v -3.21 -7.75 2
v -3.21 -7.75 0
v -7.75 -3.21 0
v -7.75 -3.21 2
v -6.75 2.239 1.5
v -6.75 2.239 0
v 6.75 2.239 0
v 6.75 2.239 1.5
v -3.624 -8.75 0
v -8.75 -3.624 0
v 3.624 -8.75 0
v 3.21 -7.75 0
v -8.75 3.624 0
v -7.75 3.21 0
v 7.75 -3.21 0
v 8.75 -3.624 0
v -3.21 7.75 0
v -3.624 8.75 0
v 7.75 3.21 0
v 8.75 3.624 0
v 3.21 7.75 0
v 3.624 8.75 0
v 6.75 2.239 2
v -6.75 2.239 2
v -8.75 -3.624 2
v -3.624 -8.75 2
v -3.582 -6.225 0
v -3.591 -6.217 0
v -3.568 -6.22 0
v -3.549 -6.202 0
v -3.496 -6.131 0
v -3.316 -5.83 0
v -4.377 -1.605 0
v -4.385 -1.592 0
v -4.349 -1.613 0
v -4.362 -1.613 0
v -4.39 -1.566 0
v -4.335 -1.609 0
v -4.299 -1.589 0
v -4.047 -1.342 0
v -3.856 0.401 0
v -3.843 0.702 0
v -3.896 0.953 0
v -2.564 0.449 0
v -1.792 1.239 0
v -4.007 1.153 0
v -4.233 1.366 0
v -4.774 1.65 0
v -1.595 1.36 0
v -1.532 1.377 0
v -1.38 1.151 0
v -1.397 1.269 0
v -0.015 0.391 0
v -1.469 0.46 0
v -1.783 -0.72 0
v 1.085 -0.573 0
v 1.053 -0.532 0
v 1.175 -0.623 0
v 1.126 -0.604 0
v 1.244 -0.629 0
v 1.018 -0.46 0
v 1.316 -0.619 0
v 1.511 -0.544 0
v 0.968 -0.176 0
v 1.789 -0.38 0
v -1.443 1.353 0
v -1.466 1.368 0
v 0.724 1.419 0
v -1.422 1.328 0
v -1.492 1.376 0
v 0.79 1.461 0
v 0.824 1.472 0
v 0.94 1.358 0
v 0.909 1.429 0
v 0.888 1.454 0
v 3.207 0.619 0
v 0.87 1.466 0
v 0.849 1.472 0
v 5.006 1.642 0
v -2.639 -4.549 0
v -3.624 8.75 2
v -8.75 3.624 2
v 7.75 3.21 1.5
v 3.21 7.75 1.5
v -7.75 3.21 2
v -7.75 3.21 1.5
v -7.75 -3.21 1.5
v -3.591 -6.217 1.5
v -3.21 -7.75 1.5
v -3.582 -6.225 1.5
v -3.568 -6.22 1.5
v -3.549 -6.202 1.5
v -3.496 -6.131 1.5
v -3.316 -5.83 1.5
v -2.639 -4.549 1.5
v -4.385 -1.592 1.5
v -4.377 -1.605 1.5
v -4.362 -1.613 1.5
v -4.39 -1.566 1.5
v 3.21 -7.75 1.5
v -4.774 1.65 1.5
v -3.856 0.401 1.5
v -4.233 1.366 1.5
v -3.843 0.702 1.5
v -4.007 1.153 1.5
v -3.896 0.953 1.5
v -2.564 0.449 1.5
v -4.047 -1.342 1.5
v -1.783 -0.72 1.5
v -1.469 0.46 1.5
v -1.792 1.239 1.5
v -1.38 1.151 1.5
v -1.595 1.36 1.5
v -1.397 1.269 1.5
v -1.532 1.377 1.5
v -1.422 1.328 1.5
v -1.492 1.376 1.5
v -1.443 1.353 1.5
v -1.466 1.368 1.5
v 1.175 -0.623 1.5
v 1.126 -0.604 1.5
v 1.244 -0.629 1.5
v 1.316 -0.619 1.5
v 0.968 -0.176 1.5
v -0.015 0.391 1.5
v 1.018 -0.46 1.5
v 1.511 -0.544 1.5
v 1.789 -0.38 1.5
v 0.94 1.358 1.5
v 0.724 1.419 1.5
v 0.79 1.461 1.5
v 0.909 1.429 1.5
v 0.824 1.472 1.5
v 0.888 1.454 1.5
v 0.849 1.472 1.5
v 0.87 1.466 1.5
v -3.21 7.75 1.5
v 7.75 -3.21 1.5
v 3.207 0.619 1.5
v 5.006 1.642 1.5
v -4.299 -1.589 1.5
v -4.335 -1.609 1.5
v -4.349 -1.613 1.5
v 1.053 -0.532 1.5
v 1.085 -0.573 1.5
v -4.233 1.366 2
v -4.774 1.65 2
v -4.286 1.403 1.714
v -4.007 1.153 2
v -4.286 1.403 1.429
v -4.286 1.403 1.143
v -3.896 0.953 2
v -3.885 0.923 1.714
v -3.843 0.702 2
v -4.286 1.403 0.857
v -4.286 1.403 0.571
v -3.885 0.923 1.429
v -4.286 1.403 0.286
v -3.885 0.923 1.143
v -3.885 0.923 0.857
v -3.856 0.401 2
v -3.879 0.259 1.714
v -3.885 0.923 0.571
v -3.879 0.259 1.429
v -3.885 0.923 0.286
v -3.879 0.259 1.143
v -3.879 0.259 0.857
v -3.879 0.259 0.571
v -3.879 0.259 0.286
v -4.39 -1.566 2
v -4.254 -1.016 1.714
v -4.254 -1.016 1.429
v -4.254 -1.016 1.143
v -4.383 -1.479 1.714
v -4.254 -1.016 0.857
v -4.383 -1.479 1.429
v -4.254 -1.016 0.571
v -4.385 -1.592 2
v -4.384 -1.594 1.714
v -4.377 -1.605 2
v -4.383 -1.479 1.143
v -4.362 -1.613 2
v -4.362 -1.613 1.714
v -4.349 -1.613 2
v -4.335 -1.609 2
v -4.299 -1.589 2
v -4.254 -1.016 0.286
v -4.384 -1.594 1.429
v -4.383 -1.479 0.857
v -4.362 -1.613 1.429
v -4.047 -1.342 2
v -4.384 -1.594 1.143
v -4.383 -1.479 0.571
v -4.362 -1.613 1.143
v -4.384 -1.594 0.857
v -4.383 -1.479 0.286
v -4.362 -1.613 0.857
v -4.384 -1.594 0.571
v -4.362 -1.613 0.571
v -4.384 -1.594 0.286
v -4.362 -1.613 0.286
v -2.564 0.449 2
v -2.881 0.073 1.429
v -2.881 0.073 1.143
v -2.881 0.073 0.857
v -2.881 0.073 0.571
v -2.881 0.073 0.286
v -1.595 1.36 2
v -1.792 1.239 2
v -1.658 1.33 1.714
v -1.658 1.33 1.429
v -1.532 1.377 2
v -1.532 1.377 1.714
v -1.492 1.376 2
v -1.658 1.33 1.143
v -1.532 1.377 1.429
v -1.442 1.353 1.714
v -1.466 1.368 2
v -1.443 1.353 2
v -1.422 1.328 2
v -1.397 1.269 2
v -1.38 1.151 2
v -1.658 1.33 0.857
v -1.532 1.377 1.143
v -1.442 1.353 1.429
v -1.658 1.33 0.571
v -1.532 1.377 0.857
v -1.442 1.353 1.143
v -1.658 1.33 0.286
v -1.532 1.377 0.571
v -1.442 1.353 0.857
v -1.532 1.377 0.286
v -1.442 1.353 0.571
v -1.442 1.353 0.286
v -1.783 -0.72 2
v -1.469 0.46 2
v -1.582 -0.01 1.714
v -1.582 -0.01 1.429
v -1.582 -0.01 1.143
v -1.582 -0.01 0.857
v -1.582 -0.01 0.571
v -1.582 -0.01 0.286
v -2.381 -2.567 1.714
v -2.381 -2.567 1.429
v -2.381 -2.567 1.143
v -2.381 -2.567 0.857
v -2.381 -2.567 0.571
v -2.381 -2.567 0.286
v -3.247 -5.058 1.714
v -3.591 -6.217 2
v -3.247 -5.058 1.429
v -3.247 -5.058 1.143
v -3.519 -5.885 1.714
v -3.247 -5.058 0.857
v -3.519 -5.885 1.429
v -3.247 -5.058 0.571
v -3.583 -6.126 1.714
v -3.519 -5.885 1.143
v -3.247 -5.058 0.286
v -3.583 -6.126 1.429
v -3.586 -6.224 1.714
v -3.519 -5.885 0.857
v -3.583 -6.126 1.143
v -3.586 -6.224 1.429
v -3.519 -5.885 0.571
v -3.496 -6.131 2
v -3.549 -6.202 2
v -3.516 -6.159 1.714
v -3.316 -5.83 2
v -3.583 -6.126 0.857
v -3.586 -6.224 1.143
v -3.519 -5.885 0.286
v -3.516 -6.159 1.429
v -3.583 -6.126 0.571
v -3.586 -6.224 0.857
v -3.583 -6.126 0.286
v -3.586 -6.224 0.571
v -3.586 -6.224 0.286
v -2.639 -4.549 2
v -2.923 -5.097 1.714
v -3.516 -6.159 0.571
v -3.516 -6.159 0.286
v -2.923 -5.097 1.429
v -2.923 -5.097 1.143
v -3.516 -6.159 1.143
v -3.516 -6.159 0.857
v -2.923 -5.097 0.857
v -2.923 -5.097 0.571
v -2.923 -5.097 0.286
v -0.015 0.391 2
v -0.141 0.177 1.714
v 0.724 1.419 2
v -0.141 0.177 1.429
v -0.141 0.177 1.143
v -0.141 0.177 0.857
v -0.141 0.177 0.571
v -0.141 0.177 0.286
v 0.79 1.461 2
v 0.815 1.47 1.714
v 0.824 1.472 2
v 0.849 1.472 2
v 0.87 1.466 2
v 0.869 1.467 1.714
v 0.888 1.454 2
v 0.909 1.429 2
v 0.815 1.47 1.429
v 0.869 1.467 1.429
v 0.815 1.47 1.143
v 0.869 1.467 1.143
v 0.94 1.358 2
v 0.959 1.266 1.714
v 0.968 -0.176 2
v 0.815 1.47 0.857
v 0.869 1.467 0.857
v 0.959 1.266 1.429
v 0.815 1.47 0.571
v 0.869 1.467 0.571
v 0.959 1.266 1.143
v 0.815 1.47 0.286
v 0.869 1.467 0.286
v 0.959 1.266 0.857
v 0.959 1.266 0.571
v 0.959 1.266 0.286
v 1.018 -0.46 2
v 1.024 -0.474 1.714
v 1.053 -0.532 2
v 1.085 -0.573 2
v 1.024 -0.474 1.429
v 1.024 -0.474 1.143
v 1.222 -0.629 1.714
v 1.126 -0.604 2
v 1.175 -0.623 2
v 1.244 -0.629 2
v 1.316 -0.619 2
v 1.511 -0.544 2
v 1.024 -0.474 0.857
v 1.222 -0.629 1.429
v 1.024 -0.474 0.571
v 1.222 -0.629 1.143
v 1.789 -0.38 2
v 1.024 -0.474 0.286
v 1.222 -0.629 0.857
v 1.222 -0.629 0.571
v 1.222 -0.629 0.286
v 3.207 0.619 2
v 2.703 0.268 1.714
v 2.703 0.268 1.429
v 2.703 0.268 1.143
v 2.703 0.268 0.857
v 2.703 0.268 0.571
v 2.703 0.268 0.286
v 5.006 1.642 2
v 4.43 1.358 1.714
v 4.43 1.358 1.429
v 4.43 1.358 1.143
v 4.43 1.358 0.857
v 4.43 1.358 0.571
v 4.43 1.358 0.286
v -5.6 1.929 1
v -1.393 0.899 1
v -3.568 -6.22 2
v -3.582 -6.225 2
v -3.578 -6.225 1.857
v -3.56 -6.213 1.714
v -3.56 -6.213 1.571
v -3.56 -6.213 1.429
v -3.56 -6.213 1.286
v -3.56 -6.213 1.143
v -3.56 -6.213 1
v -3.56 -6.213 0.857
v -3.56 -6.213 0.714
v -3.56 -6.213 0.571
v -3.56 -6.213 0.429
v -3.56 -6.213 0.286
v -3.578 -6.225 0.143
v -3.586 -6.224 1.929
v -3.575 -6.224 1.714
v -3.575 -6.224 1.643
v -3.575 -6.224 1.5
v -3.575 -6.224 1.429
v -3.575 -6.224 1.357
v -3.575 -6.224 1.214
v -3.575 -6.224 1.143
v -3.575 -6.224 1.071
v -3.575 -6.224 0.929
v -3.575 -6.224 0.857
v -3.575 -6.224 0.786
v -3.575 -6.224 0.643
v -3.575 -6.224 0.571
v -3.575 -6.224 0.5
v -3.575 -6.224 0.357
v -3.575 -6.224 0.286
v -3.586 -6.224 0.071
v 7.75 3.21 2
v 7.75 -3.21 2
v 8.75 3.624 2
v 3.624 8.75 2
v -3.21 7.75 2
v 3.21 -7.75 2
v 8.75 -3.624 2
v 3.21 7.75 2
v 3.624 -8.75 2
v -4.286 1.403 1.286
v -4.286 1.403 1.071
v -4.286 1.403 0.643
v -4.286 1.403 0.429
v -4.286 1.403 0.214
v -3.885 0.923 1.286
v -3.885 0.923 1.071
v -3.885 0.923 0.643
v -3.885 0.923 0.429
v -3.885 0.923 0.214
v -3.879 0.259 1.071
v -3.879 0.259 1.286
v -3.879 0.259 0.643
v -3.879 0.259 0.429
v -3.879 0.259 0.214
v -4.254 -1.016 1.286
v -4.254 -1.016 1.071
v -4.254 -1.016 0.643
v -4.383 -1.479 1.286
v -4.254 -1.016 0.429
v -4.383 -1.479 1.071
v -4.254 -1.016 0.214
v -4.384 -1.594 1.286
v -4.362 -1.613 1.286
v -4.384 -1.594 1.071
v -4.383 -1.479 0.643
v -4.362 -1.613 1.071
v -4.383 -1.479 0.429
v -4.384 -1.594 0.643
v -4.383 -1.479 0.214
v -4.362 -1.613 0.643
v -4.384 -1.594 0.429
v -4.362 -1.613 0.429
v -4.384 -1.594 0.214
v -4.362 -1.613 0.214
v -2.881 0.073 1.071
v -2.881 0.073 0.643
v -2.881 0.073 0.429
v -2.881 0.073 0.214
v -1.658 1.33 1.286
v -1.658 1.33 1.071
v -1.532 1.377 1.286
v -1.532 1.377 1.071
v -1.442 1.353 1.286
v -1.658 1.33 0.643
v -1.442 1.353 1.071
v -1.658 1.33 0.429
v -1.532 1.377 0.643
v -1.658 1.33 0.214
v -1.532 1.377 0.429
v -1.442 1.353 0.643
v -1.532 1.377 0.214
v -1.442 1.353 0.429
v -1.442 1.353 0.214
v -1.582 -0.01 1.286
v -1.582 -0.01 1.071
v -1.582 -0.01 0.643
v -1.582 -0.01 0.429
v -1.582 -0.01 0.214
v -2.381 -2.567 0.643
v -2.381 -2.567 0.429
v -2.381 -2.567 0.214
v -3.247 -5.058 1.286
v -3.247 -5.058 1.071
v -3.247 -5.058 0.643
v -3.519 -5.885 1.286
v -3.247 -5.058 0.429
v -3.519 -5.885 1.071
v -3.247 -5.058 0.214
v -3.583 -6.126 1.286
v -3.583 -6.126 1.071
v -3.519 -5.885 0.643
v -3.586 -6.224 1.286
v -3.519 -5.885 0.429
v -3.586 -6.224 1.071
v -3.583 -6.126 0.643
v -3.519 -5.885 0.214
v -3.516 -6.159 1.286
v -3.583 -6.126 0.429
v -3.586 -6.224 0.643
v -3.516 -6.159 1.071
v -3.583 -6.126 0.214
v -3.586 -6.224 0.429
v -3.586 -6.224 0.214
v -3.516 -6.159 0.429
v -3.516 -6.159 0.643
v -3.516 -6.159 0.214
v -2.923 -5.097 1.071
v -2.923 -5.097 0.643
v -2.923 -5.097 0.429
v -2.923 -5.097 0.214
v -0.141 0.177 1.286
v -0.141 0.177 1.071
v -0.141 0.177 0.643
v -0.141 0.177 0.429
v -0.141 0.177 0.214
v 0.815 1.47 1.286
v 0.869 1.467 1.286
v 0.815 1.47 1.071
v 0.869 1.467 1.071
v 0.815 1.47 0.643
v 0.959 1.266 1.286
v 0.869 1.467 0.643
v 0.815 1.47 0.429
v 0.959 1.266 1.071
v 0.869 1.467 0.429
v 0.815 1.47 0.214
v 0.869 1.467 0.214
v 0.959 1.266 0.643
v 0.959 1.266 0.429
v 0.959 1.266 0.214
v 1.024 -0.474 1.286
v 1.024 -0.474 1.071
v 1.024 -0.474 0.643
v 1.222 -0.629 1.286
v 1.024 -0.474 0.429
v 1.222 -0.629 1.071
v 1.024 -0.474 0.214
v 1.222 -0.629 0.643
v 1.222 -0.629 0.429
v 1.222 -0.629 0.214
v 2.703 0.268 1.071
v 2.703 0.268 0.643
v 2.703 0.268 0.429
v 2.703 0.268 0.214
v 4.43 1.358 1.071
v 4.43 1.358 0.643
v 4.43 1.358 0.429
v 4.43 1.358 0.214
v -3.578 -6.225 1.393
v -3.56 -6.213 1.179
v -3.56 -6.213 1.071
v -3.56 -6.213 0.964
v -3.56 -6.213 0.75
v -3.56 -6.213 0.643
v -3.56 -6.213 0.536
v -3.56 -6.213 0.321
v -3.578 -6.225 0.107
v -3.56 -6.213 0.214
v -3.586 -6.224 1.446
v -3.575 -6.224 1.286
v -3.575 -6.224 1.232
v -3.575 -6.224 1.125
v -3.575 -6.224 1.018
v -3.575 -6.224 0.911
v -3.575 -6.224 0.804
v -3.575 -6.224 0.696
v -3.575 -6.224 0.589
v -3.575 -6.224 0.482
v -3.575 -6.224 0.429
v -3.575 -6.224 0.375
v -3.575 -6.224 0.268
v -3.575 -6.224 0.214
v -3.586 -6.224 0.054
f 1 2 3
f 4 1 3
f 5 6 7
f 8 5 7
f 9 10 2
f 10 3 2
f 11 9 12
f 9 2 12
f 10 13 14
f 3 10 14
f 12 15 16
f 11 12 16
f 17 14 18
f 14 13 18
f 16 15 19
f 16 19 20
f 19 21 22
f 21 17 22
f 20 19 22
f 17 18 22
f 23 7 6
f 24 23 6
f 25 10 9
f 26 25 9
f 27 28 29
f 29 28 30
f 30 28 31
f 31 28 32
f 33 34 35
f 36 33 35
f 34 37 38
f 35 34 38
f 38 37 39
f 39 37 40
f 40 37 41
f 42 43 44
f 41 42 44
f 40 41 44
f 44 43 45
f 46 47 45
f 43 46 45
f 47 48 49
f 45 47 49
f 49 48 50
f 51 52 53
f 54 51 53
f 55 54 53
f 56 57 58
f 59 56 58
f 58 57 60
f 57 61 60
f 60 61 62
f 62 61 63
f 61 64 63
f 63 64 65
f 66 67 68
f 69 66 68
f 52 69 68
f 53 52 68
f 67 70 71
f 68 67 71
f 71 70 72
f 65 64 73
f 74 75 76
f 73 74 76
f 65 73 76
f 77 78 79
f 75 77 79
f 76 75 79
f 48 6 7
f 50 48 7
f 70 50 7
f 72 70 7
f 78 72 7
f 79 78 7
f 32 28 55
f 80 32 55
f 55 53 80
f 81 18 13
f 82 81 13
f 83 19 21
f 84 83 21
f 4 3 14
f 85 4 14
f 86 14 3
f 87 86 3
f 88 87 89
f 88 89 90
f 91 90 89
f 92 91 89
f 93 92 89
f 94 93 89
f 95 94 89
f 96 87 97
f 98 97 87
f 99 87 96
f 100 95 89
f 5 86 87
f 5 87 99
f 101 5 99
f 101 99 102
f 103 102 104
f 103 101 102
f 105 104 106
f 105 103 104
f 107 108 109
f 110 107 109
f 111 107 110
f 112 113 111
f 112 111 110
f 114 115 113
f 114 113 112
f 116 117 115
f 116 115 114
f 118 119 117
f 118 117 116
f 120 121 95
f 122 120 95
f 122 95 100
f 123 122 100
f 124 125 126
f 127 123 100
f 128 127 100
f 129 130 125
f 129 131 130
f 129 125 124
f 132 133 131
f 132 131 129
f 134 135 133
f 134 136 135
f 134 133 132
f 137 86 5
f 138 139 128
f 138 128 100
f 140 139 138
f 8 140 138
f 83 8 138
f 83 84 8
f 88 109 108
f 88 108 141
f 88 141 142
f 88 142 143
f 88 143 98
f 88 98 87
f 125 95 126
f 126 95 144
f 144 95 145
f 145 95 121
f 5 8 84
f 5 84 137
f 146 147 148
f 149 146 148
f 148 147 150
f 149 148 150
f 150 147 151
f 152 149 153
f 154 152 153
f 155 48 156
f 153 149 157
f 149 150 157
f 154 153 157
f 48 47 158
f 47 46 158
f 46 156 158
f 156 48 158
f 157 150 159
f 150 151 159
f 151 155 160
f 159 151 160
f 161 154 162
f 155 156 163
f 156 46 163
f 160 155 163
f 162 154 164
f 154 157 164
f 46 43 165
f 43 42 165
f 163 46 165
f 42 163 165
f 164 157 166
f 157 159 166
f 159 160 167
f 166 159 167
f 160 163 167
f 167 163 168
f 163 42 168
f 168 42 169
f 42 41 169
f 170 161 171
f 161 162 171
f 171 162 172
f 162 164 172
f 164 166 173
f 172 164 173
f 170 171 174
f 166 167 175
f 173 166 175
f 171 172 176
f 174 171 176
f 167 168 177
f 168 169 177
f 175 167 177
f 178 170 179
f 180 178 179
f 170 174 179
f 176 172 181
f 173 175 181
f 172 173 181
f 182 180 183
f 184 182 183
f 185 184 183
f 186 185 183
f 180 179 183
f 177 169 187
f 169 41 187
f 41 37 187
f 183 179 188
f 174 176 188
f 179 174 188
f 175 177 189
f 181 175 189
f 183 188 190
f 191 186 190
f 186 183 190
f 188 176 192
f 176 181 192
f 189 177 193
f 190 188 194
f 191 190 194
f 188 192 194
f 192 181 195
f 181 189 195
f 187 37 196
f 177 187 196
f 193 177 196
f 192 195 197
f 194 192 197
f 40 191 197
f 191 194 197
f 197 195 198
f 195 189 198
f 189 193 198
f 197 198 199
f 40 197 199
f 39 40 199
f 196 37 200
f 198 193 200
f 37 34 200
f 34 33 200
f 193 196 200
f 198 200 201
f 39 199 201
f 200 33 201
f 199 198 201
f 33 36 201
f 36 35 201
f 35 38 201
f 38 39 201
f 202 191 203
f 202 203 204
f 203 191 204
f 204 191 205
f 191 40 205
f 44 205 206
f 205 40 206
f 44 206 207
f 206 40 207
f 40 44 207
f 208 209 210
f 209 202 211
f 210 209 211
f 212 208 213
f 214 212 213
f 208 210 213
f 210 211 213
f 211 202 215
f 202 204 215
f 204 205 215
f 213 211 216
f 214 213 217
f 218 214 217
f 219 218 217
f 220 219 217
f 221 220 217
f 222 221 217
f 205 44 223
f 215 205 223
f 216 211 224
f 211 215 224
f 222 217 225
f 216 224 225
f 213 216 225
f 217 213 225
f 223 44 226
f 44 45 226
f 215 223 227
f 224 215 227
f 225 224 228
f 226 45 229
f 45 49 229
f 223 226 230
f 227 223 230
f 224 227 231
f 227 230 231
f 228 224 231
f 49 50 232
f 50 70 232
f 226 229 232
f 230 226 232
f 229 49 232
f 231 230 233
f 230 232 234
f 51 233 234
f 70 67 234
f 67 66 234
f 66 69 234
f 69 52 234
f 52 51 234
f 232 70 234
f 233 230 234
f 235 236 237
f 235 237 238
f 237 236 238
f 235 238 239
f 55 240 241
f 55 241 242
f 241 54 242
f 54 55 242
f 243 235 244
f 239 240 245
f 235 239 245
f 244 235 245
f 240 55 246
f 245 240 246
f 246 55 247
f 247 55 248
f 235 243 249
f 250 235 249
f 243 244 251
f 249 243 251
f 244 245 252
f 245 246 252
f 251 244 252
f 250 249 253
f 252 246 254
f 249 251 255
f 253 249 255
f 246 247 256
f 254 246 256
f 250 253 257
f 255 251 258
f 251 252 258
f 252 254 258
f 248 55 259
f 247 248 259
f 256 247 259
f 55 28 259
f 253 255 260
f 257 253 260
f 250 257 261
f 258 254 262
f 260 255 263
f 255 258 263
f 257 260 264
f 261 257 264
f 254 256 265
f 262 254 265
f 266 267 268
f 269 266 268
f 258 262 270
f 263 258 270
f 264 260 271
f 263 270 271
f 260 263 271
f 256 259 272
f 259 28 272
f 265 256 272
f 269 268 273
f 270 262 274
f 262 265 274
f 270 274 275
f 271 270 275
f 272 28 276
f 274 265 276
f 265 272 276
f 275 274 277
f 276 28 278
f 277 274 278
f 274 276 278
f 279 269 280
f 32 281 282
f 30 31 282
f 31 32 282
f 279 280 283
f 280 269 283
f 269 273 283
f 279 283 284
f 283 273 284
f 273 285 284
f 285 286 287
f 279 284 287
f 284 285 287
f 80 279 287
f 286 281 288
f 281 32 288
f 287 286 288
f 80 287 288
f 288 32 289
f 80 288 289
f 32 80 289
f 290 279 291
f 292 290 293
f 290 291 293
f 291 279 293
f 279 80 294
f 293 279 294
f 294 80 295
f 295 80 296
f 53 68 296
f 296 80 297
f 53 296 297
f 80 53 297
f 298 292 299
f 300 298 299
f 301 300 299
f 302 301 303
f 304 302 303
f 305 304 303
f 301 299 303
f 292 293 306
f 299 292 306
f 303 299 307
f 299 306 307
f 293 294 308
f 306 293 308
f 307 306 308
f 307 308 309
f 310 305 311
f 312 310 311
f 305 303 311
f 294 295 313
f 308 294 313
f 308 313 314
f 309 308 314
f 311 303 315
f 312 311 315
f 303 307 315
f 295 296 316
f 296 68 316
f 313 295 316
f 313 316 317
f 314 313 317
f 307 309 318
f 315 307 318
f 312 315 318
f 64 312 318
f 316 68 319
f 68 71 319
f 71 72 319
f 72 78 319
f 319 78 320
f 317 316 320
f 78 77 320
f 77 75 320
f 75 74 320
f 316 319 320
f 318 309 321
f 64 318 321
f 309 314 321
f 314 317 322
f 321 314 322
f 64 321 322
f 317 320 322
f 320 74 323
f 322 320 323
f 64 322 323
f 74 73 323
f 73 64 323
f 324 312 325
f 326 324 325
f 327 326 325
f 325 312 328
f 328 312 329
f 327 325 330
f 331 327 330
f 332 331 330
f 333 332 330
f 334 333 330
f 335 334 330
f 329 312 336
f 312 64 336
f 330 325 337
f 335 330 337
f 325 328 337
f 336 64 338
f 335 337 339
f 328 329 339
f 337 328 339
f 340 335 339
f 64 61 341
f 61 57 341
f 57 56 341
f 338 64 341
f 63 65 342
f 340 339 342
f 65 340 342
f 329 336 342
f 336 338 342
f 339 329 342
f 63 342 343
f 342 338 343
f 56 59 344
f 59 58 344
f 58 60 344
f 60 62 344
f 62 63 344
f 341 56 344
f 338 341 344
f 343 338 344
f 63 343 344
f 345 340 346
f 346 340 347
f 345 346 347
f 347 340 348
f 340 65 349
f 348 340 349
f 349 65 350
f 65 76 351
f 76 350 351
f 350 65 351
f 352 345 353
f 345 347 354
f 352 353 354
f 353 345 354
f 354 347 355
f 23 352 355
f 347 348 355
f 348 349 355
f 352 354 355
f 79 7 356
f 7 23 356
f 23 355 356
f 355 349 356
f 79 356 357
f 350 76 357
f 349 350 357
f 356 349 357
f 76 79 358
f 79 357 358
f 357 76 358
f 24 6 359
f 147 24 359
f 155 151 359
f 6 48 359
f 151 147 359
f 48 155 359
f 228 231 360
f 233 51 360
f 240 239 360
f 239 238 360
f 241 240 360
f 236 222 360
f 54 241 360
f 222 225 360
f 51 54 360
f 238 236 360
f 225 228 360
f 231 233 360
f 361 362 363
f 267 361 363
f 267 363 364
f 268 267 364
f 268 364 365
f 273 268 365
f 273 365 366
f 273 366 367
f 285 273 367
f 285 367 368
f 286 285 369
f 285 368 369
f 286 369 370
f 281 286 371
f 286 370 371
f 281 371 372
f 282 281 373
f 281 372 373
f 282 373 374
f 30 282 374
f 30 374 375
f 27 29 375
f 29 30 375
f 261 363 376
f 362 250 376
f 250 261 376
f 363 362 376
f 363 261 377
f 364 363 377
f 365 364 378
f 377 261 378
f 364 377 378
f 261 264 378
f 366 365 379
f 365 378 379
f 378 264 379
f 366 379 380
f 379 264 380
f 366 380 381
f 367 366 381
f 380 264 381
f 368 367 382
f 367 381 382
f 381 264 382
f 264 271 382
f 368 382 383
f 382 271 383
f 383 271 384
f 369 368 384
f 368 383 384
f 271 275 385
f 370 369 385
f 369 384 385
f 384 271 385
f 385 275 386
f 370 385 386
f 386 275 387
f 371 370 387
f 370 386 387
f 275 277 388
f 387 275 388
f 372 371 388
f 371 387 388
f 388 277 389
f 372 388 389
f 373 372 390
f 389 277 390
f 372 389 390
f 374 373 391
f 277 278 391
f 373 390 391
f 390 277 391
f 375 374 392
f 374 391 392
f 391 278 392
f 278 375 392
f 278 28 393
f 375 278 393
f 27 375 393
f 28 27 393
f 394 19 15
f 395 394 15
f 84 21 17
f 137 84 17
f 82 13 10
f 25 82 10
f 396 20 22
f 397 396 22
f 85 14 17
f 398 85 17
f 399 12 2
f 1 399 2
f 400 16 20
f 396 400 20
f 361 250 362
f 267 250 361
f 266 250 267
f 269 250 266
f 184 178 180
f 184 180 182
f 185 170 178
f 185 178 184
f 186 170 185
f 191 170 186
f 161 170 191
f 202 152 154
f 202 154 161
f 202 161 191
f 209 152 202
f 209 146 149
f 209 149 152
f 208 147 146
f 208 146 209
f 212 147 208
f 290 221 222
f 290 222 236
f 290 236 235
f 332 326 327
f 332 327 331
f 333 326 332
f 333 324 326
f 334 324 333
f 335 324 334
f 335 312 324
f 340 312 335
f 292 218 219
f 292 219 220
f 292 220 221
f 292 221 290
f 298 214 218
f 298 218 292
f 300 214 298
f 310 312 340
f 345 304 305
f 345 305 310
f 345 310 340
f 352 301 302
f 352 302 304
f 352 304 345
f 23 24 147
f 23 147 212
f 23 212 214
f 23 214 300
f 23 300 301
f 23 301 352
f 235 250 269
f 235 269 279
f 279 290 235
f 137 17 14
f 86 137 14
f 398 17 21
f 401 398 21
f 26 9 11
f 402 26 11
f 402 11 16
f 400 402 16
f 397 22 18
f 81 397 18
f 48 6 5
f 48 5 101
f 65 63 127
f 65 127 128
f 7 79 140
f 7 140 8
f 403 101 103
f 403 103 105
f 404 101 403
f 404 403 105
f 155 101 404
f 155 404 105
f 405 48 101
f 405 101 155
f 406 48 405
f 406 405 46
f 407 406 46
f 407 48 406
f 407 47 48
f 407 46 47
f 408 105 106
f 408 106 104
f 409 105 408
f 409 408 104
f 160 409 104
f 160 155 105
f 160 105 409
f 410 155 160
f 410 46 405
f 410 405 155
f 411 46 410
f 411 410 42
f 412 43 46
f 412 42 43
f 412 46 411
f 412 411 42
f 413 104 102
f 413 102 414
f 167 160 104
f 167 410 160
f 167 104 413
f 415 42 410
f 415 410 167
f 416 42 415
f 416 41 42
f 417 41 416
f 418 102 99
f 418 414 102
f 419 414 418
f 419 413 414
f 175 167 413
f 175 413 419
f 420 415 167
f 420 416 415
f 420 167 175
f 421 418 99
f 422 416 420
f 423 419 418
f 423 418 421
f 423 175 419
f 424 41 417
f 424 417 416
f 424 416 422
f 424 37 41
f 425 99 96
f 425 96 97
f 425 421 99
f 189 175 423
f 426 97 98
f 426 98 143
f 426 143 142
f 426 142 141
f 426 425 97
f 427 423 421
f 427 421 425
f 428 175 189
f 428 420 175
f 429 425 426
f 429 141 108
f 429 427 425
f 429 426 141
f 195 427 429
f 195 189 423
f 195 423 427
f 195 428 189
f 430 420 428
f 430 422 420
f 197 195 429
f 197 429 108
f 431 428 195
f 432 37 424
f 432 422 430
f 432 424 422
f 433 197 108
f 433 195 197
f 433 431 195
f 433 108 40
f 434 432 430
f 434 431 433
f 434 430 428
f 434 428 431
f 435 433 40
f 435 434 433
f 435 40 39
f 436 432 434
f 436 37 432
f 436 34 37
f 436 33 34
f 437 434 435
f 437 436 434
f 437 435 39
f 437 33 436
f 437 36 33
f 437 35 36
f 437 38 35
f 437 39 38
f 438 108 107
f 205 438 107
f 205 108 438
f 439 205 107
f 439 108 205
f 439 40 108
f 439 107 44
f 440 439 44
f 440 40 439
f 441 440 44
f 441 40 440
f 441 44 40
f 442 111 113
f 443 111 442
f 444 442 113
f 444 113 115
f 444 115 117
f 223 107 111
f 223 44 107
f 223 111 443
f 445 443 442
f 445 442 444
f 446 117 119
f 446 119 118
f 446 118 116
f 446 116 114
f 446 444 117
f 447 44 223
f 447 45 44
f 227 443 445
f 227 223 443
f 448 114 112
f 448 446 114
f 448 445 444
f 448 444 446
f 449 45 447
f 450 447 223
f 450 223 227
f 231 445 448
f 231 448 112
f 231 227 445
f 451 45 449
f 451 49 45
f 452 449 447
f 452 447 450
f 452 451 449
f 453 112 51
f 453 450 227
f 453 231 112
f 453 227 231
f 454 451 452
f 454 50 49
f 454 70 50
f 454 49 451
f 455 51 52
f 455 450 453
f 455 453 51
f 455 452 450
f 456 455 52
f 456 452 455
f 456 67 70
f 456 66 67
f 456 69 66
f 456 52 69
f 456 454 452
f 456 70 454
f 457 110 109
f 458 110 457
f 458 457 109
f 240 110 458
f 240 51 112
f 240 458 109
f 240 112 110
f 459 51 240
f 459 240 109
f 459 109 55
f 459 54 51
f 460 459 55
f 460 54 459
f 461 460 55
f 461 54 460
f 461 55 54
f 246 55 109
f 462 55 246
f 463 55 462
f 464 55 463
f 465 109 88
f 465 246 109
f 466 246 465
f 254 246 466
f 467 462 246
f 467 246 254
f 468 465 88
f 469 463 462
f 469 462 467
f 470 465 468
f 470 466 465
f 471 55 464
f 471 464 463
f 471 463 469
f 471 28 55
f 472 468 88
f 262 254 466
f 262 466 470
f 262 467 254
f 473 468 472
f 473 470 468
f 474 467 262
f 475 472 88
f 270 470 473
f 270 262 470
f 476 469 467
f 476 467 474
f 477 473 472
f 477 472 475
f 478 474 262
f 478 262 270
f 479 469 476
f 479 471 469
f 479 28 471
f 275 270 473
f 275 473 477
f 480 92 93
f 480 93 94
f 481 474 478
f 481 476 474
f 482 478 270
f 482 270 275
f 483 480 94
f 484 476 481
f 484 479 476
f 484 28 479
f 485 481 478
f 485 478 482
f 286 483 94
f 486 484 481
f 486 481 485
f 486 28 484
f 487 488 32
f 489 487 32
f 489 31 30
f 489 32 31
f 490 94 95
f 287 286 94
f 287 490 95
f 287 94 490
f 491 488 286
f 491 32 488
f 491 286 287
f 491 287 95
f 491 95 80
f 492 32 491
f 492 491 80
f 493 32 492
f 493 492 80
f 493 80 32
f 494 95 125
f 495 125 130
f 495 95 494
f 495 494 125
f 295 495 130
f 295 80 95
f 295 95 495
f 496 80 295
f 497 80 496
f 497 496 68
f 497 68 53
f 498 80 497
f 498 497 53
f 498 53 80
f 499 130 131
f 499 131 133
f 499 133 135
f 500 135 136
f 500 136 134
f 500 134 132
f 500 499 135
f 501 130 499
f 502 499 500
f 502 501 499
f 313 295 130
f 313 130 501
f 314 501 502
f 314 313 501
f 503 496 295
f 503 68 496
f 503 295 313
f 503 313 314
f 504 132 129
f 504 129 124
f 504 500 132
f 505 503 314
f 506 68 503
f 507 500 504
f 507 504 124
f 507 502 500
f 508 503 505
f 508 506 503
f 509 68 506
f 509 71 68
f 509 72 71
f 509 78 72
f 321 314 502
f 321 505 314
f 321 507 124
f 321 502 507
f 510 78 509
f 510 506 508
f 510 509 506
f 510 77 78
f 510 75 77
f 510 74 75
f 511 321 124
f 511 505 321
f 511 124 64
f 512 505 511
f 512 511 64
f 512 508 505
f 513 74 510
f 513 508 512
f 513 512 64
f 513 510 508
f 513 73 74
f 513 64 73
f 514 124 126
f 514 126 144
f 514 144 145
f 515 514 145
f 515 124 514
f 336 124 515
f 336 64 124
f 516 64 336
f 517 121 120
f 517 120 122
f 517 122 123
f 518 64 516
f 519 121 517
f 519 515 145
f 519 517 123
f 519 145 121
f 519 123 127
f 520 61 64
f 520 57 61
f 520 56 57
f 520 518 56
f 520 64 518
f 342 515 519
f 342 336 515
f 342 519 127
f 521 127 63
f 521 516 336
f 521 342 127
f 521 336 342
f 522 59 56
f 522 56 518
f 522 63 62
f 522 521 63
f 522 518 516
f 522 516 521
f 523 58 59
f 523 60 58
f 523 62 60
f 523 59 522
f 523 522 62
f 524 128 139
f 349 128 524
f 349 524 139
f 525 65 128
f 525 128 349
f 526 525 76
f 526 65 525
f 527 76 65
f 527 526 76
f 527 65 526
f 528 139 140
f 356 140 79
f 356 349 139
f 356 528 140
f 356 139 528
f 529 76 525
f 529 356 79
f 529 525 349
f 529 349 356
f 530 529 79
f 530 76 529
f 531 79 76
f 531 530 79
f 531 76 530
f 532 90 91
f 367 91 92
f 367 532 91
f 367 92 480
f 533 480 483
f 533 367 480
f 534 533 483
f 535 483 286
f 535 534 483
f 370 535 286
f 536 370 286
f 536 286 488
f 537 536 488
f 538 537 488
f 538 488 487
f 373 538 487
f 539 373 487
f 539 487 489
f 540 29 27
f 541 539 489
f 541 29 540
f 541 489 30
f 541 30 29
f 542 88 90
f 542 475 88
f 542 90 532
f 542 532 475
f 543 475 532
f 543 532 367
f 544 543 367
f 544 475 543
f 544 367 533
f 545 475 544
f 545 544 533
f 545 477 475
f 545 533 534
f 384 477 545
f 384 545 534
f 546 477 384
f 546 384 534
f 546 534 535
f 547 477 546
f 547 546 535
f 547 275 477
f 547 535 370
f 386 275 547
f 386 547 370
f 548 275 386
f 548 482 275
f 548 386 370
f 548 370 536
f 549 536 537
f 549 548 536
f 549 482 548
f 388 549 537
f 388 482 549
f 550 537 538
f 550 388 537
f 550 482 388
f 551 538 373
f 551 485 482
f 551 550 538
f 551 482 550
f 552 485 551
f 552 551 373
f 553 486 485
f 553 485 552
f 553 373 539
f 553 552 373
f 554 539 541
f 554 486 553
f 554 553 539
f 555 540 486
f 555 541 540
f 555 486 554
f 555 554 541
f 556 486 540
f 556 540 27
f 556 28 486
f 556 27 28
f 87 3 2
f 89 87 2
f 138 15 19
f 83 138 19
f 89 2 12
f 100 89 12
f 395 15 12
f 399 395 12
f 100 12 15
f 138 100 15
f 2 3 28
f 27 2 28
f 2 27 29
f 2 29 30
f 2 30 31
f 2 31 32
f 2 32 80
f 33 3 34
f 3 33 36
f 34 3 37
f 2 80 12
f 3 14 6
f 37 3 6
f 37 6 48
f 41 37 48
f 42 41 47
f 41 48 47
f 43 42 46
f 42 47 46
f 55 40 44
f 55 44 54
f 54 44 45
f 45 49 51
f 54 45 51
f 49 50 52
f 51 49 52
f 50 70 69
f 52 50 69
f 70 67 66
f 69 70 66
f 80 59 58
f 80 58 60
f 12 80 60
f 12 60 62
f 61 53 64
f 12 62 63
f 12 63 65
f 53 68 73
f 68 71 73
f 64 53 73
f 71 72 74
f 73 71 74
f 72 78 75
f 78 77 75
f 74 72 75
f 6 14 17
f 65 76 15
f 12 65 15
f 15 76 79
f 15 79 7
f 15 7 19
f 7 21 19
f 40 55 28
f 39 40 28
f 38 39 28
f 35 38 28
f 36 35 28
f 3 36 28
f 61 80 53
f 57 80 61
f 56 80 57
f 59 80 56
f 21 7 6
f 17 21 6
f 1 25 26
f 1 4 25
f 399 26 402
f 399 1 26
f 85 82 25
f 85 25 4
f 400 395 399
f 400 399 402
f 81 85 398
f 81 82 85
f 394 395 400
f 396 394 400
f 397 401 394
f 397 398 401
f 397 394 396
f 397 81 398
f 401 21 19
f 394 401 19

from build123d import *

# Parameters (mm, degrees)
F1_DEPTH = 2
F2_DEPTH = 1.5


with BuildPart() as f1:
    # F0 (on Top) → F1 (new body)
    with BuildSketch(Plane.XY):
        Polygon((-3.6243686708, -8.75), (3.6243686708, -8.75), (8.75, -3.6243686708), (8.75, 3.6243686708), (3.6243686708, 8.75), (-3.6243686708, 8.75), (-8.75, 3.6243686708), (-8.75, -3.6243686708), align=None)
        Polygon((7.75, 3.2101551084), (7.75, -3.2101551084), (3.2101551084, -7.75), (-3.2101551084, -7.75), (-7.75, -3.2101551084), (-7.75, 3.2101551084), (-3.2101551084, 7.75), (3.2101551084, 7.75), align=None, mode=Mode.SUBTRACT)
    extrude(amount=F1_DEPTH)


with BuildPart() as f1b:
    # F0 (on Top) → F1, piece 2 (new body)
    with BuildSketch(Plane.XY):
        with BuildLine():
            Line((6.75, 2.2385702382), (-6.75, 2.2385702382))
            add(Edge.make_bspline(
                [(-6.75, 2.2385702382), (-4.208272589, 1.5922287497), (-3.2838460011, 1.1111580556), (-5.3915167133, -3.5163610872), (1.1195887936, 5.961863319), (-6.7444728499, -13.5421892443), (1.7812913448, 4.8822403105), (0.2970349794, -2.8276414329), (3.2617528905, 1.4334352447), (6.75, 2.2385702382)],
                knots=[0, 0, 0, 0, 0.1246495782, 0.2170055941, 0.3526153393, 0.5399201669, 0.7386432265, 0.8319772922, 1, 1, 1, 1], degree=3))
        make_face()
    extrude(amount=F1_DEPTH)


with BuildPart() as f2:
    # F0 (on Top) → F2 (new body)
    with BuildSketch(Plane.XY):
        Polygon((3.2101551084, -7.75), (7.75, -3.2101551084), (7.75, 3.2101551084), (3.2101551084, 7.75), (-3.2101551084, 7.75), (-7.75, 3.2101551084), (-7.75, -3.2101551084), (-3.2101551084, -7.75), align=None)
        with BuildLine():
            add(Edge.make_bspline(
                [(-6.75, 2.2385702382), (-4.208272589, 1.5922287497), (-3.2838460011, 1.1111580556), (-5.3915167133, -3.5163610872), (1.1195887936, 5.961863319), (-6.7444728499, -13.5421892443), (1.7812913448, 4.8822403105), (0.2970349794, -2.8276414329), (3.2617528905, 1.4334352447), (6.75, 2.2385702382)],
                knots=[0, 0, 0, 0, 0.1246495782, 0.2170055941, 0.3526153393, 0.5399201669, 0.7386432265, 0.8319772922, 1, 1, 1, 1], degree=3))
            Line((-6.75, 2.2385702382), (6.75, 2.2385702382))
        make_face(mode=Mode.SUBTRACT)
    extrude(amount=F2_DEPTH)


solid = Compound([f1.part, f1b.part, f2.part])
